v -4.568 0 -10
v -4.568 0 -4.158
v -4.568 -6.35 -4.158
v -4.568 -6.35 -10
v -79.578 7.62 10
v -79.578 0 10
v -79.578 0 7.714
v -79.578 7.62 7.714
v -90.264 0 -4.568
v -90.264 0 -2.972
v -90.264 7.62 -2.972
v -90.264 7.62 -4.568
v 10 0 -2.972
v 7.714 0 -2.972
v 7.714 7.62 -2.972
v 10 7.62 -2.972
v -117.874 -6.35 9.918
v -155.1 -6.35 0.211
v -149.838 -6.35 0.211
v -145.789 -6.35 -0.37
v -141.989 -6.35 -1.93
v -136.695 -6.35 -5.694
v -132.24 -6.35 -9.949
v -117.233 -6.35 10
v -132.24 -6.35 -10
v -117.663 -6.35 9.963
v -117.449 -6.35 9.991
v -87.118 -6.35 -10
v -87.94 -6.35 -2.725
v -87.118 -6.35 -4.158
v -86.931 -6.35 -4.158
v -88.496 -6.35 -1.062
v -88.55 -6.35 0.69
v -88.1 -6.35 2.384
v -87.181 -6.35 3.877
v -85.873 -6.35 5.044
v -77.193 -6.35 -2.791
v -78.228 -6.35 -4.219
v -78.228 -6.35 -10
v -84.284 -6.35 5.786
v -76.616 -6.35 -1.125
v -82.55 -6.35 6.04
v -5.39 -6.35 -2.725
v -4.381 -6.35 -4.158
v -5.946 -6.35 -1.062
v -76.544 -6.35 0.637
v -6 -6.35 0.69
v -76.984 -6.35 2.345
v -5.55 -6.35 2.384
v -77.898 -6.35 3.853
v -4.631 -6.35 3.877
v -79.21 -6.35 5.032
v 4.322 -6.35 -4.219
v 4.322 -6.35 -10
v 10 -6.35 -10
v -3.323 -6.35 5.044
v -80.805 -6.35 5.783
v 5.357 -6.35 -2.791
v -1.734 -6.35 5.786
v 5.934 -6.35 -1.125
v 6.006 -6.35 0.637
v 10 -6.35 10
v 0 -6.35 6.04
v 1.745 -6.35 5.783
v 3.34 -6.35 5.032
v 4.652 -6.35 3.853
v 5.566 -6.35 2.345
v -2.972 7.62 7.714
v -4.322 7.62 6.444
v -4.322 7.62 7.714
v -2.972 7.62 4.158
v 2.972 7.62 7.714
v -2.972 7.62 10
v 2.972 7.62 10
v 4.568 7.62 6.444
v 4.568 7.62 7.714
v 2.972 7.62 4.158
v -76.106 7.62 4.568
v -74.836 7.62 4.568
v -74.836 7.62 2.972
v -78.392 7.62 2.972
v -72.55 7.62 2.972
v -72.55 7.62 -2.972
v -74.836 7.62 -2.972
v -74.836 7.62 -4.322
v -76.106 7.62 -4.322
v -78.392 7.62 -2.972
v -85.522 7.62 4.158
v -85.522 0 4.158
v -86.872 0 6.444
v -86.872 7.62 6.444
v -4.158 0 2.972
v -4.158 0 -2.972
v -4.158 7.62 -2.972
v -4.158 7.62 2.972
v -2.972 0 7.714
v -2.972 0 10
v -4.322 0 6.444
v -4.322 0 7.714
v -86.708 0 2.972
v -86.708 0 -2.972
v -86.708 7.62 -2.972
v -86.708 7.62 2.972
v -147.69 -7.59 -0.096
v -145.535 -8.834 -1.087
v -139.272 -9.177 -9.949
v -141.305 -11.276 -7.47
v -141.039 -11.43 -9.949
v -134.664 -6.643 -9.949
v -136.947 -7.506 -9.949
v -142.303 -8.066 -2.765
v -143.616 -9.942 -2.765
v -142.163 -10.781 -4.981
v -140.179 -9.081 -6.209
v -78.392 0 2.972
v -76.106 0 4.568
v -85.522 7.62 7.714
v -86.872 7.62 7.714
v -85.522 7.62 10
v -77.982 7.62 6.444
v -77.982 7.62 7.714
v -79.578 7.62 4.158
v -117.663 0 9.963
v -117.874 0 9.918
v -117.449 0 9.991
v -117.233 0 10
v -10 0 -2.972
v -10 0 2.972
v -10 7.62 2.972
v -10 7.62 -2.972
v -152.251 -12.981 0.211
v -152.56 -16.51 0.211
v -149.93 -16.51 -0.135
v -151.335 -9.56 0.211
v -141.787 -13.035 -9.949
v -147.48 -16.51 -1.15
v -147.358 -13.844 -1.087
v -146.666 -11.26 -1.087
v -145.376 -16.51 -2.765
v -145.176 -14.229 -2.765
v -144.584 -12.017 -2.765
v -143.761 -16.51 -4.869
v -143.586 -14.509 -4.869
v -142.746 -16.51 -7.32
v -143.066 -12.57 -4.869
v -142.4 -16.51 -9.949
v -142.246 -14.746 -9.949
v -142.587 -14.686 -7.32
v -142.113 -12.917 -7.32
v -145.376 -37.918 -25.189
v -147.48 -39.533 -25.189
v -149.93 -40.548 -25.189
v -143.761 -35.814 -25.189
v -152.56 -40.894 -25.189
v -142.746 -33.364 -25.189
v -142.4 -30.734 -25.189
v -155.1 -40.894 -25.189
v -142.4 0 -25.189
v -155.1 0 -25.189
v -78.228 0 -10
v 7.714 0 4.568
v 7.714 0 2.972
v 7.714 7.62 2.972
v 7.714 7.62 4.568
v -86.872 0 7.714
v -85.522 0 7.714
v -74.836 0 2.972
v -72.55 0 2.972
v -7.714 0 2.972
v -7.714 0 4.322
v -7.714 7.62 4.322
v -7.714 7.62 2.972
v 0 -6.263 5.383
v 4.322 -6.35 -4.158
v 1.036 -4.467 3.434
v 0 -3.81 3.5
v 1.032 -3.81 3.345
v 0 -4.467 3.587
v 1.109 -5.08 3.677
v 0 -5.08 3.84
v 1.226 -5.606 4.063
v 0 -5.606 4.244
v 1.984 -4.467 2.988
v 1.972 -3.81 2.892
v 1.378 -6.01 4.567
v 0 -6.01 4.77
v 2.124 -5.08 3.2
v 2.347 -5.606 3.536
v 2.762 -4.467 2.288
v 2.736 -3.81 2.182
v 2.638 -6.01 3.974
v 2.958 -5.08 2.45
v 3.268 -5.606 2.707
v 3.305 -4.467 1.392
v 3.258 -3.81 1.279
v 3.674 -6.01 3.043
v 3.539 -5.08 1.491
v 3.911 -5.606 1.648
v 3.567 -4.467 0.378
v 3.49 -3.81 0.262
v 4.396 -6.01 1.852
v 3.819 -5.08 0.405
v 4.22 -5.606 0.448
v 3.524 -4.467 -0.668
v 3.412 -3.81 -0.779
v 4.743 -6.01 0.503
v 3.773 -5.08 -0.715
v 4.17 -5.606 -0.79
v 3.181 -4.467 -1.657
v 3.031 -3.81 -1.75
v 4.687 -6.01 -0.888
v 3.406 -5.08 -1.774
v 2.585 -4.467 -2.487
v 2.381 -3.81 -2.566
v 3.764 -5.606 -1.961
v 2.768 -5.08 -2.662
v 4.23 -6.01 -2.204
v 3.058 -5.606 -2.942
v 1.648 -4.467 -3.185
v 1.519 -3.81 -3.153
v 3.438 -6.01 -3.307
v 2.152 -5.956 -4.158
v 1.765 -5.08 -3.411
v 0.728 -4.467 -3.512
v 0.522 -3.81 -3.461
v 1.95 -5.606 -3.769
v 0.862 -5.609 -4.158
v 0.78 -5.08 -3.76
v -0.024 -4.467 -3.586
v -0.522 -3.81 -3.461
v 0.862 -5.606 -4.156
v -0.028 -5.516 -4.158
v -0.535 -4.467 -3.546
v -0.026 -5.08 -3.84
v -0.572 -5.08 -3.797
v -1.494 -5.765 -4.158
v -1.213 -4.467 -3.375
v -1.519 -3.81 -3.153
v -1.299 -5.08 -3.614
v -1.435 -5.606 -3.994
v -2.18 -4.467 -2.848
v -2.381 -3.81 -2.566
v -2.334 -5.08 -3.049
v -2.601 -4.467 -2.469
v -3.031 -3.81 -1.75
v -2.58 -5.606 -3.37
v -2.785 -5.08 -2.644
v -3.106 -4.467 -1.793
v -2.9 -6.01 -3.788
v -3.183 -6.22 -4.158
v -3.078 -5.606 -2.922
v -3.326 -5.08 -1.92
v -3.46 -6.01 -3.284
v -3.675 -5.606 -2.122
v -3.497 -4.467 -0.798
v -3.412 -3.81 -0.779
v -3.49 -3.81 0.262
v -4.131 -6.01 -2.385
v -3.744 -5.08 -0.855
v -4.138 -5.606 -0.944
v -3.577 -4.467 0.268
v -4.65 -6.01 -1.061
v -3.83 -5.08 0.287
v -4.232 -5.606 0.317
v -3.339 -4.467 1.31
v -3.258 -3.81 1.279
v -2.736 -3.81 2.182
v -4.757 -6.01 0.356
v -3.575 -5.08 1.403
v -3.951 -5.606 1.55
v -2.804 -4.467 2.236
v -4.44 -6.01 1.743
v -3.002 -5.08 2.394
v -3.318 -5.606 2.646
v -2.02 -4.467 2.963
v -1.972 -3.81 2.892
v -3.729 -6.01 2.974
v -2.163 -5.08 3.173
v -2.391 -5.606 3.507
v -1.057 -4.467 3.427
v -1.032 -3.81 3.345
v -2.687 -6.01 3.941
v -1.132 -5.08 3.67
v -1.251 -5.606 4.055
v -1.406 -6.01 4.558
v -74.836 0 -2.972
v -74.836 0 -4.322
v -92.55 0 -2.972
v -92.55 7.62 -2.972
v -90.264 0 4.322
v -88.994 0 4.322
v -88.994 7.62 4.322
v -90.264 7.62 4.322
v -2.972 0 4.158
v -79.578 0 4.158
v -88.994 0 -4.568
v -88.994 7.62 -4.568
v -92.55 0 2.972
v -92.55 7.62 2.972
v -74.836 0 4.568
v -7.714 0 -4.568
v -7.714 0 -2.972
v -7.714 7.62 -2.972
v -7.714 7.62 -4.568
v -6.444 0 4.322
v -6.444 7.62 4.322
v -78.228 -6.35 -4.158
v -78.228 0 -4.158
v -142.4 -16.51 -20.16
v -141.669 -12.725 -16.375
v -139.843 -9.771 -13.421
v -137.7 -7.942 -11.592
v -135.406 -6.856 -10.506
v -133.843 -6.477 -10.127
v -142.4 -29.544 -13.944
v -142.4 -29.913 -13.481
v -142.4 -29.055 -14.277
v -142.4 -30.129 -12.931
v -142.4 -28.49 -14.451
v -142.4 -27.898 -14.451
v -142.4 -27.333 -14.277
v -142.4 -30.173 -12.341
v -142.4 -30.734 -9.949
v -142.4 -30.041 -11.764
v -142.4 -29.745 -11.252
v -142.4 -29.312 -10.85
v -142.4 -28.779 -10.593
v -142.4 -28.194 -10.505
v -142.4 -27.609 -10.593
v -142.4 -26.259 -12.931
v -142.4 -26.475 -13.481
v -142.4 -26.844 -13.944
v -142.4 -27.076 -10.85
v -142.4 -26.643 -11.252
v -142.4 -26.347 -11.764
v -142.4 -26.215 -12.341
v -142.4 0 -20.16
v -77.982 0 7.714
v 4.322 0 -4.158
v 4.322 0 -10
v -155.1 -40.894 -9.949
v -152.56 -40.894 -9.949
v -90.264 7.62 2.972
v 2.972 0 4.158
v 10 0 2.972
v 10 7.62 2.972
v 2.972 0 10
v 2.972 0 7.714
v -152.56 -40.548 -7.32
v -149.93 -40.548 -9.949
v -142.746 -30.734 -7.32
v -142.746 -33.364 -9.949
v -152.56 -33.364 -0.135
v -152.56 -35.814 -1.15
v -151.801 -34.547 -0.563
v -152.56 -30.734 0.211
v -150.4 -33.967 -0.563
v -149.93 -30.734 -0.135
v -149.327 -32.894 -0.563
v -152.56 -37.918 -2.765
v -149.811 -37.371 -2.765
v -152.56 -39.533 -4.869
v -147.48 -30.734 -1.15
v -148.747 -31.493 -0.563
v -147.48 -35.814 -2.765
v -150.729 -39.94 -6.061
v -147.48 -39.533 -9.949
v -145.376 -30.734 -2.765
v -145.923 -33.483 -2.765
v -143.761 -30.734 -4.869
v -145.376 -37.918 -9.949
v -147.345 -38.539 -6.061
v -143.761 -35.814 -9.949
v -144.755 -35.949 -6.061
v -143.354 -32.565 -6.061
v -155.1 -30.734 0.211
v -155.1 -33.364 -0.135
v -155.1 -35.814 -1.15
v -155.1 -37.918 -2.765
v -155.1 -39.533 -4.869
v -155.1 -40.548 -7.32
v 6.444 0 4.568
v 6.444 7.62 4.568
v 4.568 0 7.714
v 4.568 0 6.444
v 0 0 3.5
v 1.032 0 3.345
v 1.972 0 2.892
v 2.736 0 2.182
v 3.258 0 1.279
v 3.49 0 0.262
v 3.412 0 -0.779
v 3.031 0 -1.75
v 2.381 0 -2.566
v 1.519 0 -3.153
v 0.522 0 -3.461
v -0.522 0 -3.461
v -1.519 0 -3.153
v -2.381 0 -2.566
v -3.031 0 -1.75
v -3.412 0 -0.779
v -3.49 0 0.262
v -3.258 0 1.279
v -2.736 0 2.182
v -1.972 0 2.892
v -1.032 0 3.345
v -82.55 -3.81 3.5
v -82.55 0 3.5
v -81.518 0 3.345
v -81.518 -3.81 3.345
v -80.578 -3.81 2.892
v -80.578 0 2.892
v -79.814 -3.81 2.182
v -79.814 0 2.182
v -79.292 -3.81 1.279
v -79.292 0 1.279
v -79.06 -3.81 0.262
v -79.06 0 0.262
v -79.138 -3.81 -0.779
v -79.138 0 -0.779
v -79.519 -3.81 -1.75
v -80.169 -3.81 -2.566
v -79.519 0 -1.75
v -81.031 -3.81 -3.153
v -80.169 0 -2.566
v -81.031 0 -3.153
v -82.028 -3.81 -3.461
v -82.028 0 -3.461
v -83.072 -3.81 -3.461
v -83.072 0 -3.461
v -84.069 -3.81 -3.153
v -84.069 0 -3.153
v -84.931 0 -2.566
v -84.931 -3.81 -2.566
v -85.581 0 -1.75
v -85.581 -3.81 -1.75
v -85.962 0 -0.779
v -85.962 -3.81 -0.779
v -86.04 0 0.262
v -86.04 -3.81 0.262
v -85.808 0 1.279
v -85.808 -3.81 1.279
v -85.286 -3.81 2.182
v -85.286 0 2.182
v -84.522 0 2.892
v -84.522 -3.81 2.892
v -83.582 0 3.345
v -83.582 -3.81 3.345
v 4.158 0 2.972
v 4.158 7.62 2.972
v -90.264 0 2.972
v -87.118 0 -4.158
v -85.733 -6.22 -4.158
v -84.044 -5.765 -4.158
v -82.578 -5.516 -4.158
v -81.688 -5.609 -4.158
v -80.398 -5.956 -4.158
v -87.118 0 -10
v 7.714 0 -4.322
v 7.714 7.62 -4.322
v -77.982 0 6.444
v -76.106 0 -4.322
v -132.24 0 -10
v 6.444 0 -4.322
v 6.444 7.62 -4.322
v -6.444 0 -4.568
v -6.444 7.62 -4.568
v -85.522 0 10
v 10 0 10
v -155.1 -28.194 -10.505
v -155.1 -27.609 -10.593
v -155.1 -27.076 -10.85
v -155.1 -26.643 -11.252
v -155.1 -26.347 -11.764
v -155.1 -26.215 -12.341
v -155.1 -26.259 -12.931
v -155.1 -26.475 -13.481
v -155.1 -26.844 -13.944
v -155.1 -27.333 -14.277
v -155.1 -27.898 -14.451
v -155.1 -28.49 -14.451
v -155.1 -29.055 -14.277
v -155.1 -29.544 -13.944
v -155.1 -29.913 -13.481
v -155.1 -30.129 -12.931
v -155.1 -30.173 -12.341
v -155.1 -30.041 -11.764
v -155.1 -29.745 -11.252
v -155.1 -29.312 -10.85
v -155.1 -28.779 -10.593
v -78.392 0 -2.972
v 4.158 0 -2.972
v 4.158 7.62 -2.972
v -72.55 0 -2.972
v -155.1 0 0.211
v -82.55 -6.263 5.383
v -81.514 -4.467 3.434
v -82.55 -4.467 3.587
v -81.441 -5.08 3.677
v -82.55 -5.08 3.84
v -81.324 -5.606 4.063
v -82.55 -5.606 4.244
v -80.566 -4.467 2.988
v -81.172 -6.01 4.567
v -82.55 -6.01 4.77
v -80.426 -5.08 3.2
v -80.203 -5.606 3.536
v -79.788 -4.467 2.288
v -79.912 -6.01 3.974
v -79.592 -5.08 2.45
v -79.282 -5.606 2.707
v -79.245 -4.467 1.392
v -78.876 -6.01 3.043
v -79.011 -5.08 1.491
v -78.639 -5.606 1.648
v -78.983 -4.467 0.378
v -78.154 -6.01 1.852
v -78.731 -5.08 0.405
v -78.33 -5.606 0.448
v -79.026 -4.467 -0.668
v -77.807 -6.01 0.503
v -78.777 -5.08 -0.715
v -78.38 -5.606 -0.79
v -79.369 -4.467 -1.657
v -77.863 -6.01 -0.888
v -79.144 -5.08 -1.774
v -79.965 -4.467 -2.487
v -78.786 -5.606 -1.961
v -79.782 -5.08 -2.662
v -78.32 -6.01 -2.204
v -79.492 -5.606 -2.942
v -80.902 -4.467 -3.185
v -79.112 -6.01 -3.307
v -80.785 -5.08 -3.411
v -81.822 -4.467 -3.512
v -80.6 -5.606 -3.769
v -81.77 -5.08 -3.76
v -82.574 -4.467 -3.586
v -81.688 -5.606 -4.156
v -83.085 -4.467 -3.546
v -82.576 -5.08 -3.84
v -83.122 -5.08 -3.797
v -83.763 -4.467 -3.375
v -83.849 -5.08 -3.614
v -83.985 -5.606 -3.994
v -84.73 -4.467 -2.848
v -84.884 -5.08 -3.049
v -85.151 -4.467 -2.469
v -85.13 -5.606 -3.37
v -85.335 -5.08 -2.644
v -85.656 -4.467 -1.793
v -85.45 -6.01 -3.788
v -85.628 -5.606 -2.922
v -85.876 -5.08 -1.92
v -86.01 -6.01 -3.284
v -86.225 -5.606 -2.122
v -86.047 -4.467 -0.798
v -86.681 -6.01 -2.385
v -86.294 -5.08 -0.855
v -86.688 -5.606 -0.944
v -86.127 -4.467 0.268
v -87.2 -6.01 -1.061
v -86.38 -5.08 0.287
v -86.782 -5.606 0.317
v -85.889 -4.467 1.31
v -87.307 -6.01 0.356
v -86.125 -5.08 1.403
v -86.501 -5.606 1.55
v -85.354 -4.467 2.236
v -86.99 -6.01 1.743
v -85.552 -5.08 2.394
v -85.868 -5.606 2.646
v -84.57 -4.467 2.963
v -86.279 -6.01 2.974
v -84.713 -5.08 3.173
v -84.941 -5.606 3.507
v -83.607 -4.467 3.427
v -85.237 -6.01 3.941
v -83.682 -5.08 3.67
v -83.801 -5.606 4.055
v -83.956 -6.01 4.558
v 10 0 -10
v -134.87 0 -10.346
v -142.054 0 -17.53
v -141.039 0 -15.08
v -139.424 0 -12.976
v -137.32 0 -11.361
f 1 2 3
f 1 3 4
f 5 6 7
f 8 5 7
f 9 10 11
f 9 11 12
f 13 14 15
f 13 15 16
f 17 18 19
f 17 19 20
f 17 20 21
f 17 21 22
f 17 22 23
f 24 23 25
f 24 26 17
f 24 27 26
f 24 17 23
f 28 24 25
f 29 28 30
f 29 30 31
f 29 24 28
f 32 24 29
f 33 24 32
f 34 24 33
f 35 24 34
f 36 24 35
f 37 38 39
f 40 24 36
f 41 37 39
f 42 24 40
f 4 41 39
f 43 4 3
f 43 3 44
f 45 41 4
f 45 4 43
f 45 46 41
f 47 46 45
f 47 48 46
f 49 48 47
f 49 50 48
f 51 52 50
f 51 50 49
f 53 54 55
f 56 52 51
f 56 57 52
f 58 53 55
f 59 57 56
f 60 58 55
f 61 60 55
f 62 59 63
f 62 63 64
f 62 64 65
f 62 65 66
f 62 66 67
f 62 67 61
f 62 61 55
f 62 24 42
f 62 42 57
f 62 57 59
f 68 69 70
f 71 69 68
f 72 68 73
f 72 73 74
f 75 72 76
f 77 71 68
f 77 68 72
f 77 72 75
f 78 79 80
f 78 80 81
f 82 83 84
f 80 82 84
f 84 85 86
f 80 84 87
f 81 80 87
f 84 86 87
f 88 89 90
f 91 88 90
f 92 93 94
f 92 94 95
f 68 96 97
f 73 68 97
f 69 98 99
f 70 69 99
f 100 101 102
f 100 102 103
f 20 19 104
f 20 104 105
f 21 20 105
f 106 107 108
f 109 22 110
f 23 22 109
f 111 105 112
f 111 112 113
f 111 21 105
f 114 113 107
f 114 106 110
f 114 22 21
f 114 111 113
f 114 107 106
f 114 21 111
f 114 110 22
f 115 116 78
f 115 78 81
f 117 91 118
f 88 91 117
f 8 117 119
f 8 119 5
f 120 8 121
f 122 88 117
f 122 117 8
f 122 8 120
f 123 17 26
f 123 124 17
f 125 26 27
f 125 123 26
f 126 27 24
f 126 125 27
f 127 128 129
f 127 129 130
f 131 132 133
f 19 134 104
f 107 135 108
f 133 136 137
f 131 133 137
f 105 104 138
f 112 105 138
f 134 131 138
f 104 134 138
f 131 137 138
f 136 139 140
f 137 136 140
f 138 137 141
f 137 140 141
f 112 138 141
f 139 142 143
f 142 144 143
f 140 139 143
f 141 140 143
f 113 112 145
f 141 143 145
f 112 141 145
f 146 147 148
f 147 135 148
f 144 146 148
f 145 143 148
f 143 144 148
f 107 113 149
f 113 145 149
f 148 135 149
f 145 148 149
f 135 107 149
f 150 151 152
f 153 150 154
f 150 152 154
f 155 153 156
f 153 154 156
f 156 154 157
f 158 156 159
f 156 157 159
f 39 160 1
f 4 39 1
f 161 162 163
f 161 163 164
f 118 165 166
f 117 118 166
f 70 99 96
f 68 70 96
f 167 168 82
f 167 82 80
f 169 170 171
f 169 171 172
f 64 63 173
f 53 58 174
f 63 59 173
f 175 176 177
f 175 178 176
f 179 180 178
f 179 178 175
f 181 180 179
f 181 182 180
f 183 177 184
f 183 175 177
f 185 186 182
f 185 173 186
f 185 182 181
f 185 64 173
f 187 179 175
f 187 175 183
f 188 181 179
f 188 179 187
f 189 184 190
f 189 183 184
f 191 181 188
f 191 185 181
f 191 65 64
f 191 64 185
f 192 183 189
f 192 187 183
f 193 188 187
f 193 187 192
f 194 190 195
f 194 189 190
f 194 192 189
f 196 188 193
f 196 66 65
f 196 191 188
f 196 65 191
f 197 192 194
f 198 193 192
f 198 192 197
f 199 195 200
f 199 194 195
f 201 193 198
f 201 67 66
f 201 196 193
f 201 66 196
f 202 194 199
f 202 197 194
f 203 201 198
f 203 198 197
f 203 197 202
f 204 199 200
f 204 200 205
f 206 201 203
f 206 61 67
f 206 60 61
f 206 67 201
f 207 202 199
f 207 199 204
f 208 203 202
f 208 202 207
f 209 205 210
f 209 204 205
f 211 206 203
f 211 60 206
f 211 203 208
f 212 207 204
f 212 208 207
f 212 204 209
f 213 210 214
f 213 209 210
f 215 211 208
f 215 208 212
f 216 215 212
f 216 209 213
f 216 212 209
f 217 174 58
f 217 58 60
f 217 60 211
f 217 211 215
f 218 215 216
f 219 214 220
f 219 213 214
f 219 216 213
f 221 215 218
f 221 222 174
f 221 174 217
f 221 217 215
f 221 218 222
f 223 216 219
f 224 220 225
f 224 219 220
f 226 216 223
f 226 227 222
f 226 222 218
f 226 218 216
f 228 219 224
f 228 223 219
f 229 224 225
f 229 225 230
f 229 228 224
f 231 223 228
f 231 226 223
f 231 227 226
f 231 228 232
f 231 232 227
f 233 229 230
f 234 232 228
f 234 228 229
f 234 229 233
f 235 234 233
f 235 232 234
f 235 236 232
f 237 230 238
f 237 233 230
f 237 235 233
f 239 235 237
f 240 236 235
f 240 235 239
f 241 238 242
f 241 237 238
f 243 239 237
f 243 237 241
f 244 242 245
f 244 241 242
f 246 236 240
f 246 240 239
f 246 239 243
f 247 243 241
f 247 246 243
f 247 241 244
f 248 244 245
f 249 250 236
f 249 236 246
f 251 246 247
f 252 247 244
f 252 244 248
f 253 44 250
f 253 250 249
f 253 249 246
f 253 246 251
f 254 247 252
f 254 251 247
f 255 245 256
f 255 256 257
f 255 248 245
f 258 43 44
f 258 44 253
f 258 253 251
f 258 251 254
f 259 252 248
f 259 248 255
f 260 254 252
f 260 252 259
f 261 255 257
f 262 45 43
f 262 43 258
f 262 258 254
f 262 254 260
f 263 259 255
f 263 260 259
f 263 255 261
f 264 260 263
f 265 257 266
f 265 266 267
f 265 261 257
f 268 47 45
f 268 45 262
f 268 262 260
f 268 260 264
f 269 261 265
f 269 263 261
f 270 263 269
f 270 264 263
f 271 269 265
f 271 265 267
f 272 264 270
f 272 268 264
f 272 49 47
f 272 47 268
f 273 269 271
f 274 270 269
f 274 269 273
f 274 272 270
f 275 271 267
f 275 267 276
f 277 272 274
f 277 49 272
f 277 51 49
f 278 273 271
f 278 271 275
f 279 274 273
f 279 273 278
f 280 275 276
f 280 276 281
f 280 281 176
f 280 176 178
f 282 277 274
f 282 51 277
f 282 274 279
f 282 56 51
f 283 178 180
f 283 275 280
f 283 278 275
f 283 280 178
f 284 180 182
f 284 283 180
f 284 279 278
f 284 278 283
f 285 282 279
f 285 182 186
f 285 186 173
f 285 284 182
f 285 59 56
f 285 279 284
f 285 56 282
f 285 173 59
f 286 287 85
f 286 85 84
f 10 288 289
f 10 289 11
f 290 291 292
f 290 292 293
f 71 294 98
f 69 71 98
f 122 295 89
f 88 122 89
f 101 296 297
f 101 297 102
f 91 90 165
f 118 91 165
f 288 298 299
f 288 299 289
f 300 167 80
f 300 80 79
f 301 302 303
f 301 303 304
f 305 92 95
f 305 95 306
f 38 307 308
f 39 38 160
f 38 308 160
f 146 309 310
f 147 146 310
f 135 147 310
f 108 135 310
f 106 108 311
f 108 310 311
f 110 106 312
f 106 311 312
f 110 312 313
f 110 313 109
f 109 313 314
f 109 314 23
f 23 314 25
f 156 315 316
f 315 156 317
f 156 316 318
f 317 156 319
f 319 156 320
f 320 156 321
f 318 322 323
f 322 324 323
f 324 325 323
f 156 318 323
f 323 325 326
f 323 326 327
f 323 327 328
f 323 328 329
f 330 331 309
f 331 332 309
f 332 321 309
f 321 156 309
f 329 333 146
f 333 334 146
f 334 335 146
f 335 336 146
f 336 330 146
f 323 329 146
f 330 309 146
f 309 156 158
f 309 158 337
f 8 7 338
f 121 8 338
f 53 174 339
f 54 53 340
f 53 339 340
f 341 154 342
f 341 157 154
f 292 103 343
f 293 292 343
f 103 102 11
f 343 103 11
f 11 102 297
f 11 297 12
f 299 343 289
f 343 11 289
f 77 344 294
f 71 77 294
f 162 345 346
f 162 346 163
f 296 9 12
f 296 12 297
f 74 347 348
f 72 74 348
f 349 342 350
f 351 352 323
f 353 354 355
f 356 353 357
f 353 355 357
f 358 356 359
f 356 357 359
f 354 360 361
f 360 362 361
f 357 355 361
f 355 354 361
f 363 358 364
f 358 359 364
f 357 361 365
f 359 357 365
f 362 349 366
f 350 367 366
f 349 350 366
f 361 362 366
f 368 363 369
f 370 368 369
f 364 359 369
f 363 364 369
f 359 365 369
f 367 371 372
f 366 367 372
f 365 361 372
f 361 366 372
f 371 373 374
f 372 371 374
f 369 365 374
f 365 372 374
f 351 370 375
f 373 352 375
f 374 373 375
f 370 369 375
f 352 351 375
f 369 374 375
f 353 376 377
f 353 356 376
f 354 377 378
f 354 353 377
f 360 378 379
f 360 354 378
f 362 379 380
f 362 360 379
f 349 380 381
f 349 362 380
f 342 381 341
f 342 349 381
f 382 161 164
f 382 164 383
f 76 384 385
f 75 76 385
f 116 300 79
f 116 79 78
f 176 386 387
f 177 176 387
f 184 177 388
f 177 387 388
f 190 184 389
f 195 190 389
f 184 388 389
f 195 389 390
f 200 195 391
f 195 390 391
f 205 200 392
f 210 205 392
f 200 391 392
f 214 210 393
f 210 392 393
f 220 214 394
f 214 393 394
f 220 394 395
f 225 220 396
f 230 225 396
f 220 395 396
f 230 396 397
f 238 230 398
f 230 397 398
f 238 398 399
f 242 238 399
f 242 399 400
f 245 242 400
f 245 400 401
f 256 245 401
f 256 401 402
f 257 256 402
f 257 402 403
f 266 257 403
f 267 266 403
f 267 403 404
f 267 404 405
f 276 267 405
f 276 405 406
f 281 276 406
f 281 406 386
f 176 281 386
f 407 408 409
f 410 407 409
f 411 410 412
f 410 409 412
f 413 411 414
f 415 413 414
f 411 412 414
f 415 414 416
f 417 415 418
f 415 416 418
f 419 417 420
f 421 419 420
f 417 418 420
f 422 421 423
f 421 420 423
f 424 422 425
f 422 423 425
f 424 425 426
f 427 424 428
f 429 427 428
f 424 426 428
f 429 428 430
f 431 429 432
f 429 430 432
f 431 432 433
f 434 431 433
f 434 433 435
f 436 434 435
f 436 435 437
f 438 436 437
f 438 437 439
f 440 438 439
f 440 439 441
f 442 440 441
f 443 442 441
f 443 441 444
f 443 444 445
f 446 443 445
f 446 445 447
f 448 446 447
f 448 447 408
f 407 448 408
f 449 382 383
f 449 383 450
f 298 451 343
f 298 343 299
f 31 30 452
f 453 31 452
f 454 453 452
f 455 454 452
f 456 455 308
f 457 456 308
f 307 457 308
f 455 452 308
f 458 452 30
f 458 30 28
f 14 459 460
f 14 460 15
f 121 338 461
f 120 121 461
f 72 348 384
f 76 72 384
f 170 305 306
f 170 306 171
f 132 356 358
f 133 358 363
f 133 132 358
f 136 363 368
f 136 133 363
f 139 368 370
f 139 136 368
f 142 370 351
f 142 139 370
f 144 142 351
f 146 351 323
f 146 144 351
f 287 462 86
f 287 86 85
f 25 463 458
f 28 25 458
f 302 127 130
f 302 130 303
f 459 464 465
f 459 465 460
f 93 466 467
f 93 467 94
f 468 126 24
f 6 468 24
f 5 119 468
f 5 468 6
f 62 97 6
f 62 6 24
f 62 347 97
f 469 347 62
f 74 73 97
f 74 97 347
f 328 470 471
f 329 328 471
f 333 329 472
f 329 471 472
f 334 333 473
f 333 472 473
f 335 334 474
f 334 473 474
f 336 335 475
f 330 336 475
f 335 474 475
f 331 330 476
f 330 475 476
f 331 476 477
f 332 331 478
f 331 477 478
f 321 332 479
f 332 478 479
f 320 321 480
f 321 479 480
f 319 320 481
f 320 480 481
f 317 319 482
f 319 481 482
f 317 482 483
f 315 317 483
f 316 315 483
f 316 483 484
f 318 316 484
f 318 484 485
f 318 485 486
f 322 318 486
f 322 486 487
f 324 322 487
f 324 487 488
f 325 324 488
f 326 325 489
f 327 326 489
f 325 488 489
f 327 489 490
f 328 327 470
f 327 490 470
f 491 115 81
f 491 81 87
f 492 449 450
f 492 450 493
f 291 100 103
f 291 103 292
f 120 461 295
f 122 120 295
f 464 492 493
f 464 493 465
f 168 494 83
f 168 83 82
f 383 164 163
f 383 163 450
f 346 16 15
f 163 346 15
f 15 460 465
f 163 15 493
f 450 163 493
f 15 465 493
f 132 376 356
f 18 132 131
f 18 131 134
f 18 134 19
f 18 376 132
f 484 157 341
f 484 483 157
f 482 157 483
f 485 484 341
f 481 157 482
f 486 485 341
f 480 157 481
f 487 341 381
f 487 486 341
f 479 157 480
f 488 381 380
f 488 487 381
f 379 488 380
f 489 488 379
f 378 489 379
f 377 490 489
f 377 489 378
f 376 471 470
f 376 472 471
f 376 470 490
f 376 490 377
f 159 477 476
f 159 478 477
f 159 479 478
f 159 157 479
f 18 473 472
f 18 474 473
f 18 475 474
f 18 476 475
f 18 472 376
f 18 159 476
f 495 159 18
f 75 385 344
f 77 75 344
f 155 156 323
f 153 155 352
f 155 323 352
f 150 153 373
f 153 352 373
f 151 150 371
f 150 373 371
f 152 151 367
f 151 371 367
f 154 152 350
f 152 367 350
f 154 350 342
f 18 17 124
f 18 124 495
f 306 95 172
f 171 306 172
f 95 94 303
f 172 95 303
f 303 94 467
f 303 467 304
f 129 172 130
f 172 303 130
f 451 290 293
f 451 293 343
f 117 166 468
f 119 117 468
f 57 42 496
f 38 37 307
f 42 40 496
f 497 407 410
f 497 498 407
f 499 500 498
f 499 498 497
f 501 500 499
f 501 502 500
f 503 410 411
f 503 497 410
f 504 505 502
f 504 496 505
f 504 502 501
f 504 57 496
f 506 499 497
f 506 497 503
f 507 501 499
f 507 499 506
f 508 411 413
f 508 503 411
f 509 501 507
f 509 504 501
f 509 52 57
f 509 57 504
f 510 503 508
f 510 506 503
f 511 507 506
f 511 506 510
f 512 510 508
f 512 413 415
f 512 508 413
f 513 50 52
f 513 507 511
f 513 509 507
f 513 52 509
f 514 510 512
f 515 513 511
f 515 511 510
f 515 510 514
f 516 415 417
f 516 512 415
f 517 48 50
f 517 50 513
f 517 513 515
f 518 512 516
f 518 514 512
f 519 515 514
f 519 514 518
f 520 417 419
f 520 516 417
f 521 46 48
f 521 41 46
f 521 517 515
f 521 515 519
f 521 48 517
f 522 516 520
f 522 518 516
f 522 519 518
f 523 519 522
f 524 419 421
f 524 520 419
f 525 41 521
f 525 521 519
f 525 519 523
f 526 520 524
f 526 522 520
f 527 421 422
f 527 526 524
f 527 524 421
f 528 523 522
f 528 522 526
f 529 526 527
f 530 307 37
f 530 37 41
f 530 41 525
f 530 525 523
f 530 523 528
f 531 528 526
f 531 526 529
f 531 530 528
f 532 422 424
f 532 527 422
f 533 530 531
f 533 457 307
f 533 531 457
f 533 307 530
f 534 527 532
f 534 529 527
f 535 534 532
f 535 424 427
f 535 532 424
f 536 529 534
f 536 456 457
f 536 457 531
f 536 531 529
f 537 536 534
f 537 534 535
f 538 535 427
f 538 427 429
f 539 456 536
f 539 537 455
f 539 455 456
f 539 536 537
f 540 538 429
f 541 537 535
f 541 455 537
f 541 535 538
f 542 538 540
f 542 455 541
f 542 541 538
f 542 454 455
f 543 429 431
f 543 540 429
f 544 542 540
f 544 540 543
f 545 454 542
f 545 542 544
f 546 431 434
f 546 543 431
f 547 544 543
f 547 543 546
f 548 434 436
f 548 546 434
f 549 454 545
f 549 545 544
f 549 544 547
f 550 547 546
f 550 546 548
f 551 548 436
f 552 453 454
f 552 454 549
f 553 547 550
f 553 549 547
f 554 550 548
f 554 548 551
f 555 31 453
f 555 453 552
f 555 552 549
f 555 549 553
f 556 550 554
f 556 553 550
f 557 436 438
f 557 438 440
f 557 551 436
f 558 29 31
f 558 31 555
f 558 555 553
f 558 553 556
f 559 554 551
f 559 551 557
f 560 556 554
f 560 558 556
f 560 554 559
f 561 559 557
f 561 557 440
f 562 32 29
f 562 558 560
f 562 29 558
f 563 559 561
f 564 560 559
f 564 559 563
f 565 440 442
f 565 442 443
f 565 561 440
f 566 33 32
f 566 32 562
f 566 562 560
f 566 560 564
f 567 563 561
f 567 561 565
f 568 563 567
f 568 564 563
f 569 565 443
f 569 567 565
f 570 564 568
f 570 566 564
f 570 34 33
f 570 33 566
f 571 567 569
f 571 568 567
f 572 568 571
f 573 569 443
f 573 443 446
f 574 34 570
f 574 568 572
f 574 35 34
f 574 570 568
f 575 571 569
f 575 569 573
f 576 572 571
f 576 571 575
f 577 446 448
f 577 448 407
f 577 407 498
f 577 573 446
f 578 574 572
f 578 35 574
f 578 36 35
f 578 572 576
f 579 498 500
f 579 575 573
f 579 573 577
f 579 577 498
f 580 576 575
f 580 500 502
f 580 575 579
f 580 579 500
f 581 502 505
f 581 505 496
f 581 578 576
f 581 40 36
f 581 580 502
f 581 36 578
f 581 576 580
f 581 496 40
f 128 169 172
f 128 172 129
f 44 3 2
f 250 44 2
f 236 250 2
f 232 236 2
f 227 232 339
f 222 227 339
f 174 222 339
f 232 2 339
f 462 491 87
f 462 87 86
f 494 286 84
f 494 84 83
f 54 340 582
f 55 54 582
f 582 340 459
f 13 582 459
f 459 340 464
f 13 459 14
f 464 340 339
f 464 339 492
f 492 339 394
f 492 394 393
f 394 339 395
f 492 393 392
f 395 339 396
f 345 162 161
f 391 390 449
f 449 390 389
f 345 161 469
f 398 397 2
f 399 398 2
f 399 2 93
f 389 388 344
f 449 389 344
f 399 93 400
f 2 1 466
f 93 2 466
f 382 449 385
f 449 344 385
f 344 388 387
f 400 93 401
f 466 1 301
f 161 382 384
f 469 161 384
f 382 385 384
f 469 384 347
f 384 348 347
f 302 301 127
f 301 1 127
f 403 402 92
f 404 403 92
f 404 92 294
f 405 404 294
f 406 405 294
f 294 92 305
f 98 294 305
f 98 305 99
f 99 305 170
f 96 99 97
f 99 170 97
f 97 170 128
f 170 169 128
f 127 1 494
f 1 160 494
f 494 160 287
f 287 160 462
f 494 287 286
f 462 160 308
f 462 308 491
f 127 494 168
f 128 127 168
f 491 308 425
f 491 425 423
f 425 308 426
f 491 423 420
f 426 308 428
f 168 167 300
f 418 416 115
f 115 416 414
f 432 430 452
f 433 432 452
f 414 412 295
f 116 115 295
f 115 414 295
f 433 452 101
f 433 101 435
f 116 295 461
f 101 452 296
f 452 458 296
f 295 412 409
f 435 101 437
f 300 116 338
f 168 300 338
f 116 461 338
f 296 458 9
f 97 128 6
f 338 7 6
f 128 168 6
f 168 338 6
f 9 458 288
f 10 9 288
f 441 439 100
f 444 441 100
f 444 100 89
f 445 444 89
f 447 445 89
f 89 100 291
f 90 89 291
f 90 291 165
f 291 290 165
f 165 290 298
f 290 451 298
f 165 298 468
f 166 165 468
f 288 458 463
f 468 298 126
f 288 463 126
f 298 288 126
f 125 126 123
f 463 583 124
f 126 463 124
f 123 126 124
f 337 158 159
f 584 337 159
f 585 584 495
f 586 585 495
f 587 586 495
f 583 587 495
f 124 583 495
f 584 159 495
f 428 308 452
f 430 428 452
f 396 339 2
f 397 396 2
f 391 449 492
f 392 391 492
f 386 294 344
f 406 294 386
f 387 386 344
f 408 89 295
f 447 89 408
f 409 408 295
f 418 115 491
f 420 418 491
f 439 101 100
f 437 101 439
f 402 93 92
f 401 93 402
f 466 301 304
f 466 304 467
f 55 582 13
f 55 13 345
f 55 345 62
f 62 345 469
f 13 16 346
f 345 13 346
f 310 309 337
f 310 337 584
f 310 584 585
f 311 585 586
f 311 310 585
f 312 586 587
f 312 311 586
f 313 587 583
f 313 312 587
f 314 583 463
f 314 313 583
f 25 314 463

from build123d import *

# Parameters (mm, degrees)
BOSS_EXTRUDE1_DEPTH   = 7.62
BOSS_EXTRUDE1_2_DEPTH = 7.62
BOSS_EXTRUDE1_3_DEPTH = 7.62
BOSS_EXTRUDE1_4_DEPTH = 7.62
SKETCH2_W             = 165.1
SKETCH2_H             = 20
BOSS_EXTRUDE2_DEPTH   = 6.35
LPATTERN2_COUNT       = 2
LPATTERN2_PITCH       = 82.55
CUT_EXTRUDE1_DEPTH    = 157.048617104
FILLET1_R             = 2.54
SKETCH13_R            = 3.5
CUT_EXTRUDE5_DEPTH    = 156.608722121
FILLET6_R             = 2.54
SKETCH14_W            = 8.89
SKETCH14_H            = 5.842
CUT_EXTRUDE6_DEPTH    = 157.048617104
SKETCH15_W            = 25.4
SKETCH15_H            = 40.894
BOSS_EXTRUDE3_DEPTH   = 12.7
FILLET15_R            = 10.16
FILLET16_R            = 10.16
FILLET17_R            = 10.16
FILLET18_R            = 10.16
SKETCH18_R            = 1.984375
CUT_EXTRUDE9_DEPTH    = 12.7


with BuildPart() as part:
    # Sketch1 → Boss-Extrude1 (new body)
    with BuildSketch(Plane(origin=(0, 0, 0), x_dir=(1, 0, 0), z_dir=(0, 1, 0))):
        Polygon((2.9718, 10), (-2.9718, 10), (-2.9718, 7.714), (-4.567901235, 7.714), (-4.567901235, 6.444), (-2.9718, 4.158), (2.9718, 4.158), (4.322098765, 6.444), (4.322098765, 7.714), (2.9718, 7.714), align=None)
    boss_extrude1 = extrude(amount=BOSS_EXTRUDE1_DEPTH)



with BuildPart() as body_2:
    # Sketch1 → Boss-Extrude1 2 (new body)
    with BuildSketch(Plane(origin=(0, 0, 0), x_dir=(1, 0, 0), z_dir=(0, 1, 0))):
        Polygon((4.158, -2.9718), (4.158, 2.9718), (6.444, 4.322098765), (7.714, 4.322098765), (7.714, 2.9718), (10, 2.9718), (10, -2.9718), (7.714, -2.9718), (7.714, -4.567901235), (6.444, -4.567901235), align=None)
    boss_extrude1_2 = extrude(amount=BOSS_EXTRUDE1_2_DEPTH)


with BuildPart() as body_3:
    # Sketch1 → Boss-Extrude1 3 (new body)
    with BuildSketch(Plane(origin=(0, 0, 0), x_dir=(1, 0, 0), z_dir=(0, 1, 0))):
        Polygon((-10, -2.9718), (-10, 2.9718), (-7.714, 2.9718), (-7.714, 4.567901235), (-6.444, 4.567901235), (-4.158, 2.9718), (-4.158, -2.9718), (-6.444, -4.322098765), (-7.714, -4.322098765), (-7.714, -2.9718), align=None)
    boss_extrude1_3 = extrude(amount=BOSS_EXTRUDE1_3_DEPTH)


with BuildPart() as body_4:
    # Sketch1 → Boss-Extrude1 4 (new body)
    with BuildSketch(Plane(origin=(0, 0, 0), x_dir=(1, 0, 0), z_dir=(0, 1, 0))):
        Polygon((4.567901235, -6.444), (2.9718, -4.158), (-2.9718, -4.158), (-4.322098765, -6.444), (-4.322098765, -7.714), (-2.9718, -7.714), (-2.9718, -10), (2.9718, -10), (2.9718, -7.714), (4.567901235, -7.714), align=None)
    boss_extrude1_4 = extrude(amount=BOSS_EXTRUDE1_4_DEPTH)


with BuildPart() as part_1:
    add(part.part)

    add(body_2.part)  # Boss-Extrude2 merges body 2

    add(body_3.part)  # Boss-Extrude2 merges body 3

    add(body_4.part)  # Boss-Extrude2 merges body 4
    # Sketch2 → Boss-Extrude2 (add)
    with BuildSketch(Plane.XZ):
        with Locations((-72.55, 0)):
            Rectangle(SKETCH2_W, SKETCH2_H)
    extrude(amount=BOSS_EXTRUDE2_DEPTH)

    # LPattern2: Boss-Extrude1, Boss-Extrude1 2, Boss-Extrude1 3, Boss-Extrude1 4 ×2
    with Locations(*[(-i * LPATTERN2_PITCH, 0, 0) for i in range(1, LPATTERN2_COUNT)]):
        add(boss_extrude1)
        add(boss_extrude1_2)
        add(boss_extrude1_3)
        add(boss_extrude1_4)

    # Sketch4 → Cut-Extrude1 (cut, through all)
    with BuildSketch(Plane(origin=(0, -6.35, 0), x_dir=(-1, 0, 0), z_dir=(0, -1, 0))):
        Polygon((155.1, -10), (117.5588, -10), (155.1, -0.2108), align=None)
    extrude(amount=-CUT_EXTRUDE1_DEPTH, mode=Mode.SUBTRACT)

    # Fillet1
    fillet1_edges = [part_1.edges().sort_by_distance(p)[0] for p in [
        (-117.5588, -3.175, 10),
    ]]
    fillet(fillet1_edges, radius=FILLET1_R)

    # Sketch13 → Cut-Extrude5 (cut, through all)
    with BuildSketch(Plane(origin=(0, 0, 0), x_dir=(1, 0, 0), z_dir=(0, 1, 0))):
        with Locations(Location((0, 0, 0), (0, 0, 270))):
            Circle(SKETCH13_R)
        with Locations(Location((-82.55, 0, 0), (0, 0, 270))):
            Circle(SKETCH13_R)
    extrude(amount=-CUT_EXTRUDE5_DEPTH, mode=Mode.SUBTRACT)

    # Fillet6
    fillet6_edges = [part_1.edges().sort_by_distance(p)[0] for p in [
        (0, -6.35, -3.5),
        (-82.55, -6.35, -3.5),
    ]]
    fillet(fillet6_edges, radius=FILLET6_R)

    # Sketch14 → Cut-Extrude6 (cut, through all)
    with BuildSketch(Plane(origin=(0, 7.62, 0), x_dir=(1, 0, 0), z_dir=(0, 1, 0))):
        with Locations((-0.122901235, 7.079)):
            Rectangle(SKETCH14_W, SKETCH14_H)
        with Locations((-82.672901235, 7.079)):
            Rectangle(SKETCH14_W, SKETCH14_H)
    extrude(amount=-CUT_EXTRUDE6_DEPTH, mode=Mode.SUBTRACT)

    # Sketch15 → Boss-Extrude3 (add)
    with BuildSketch(Plane.ZY.offset(155.1)):
        with Locations((-12.4892, -20.447)):
            Rectangle(SKETCH15_W, SKETCH15_H)
    extrude(amount=-BOSS_EXTRUDE3_DEPTH)

    # Fillet15
    fillet15_edges = [part_1.edges().sort_by_distance(p)[0] for p in [
        (-142.4, -6.35, -4.8946),
    ]]
    fillet(fillet15_edges, radius=FILLET15_R)

    # Fillet16
    fillet16_edges = [part_1.edges().sort_by_distance(p)[0] for p in [
        (-142.4, -8.255, -10),
    ]]
    fillet(fillet16_edges, radius=FILLET16_R)

    # Fillet17
    fillet17_edges = [part_1.edges().sort_by_distance(p)[0] for p in [
        (-142.4, -40.894, -12.4892),
    ]]
    fillet(fillet17_edges, radius=FILLET17_R)

    # Fillet18
    fillet18_edges = [part_1.edges().sort_by_distance(p)[0] for p in [
        (-139.424204897, -9.325795103, 0.2108),
        (-153.83, -40.894, 0.2108),
        (-142.4, -23.622, 0.2108),
        (-145.375795103, -37.918204897, 0.2108),
    ]]
    fillet(fillet18_edges, radius=FILLET18_R)

    # Sketch18 → Cut-Extrude9 (cut)
    with BuildSketch(Plane.ZY.offset(155.1)):
        with Locations((-12.4892, -28.194)):
            Circle(SKETCH18_R)
    extrude(amount=-CUT_EXTRUDE9_DEPTH, mode=Mode.SUBTRACT)


solid = part_1.part
